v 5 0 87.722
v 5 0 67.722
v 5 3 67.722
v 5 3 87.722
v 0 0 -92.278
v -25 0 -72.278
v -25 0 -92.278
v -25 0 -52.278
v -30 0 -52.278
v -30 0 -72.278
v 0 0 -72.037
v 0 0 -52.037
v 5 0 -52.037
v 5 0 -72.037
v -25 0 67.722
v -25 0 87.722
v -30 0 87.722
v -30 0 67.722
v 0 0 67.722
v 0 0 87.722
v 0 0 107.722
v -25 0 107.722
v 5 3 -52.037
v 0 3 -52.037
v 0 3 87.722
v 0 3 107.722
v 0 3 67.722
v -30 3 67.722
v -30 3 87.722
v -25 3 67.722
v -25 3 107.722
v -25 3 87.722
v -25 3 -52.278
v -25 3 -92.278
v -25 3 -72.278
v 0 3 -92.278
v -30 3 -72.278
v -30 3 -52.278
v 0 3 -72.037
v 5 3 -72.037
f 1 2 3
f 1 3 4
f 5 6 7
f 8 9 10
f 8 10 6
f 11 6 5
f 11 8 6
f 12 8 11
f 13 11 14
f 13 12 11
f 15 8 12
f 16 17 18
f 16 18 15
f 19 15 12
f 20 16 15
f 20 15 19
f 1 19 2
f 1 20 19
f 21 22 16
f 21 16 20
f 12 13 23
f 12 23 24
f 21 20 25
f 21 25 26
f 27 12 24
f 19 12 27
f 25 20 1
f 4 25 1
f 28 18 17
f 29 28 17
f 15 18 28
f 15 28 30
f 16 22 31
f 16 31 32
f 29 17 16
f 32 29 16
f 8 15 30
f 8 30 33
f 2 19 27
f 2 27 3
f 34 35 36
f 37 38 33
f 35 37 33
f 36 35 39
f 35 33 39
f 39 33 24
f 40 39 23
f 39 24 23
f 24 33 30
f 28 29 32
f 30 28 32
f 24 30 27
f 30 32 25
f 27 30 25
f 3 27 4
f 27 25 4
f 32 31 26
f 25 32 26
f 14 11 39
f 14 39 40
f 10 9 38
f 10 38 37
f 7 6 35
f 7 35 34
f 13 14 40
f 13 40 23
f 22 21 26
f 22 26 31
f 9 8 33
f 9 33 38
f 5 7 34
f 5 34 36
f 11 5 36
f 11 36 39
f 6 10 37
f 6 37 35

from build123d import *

# Parameters (mm, degrees)
F0_W     = 5
F0_H     = 20
F1_DEPTH = 3


with BuildPart() as f1:
    # F0 (on Front) → F1 (new body)
    with BuildSketch(Plane.XZ):
        Polygon((0, 107.721728), (-25, 107.721728), (-25, 87.721728), (-25, 67.721728), (-25, -52.278272), (-25, -72.278272), (-25, -92.278272), (0, -92.278272), (0, -72.278272), (0, -72.036713), (0, -52.036713), (0, 67.721728), (0, 87.721728), align=None)
        with Locations((2.5, 77.721728)):
            Rectangle(F0_W, F0_H)
        with Locations((-27.5, 77.721728)):
            Rectangle(F0_W, F0_H)
        Polygon((3, -52.036713), (0, -52.036713), (0, -72.036713), (5, -72.036713), (5, -52.036713), align=None)
        Polygon((-25, -72.278272), (-25, -52.278272), (-28, -52.278272), (-30, -52.278272), (-30, -72.278272), (-28, -72.278272), align=None)
    extrude(amount=-F1_DEPTH)


solid = f1.part
